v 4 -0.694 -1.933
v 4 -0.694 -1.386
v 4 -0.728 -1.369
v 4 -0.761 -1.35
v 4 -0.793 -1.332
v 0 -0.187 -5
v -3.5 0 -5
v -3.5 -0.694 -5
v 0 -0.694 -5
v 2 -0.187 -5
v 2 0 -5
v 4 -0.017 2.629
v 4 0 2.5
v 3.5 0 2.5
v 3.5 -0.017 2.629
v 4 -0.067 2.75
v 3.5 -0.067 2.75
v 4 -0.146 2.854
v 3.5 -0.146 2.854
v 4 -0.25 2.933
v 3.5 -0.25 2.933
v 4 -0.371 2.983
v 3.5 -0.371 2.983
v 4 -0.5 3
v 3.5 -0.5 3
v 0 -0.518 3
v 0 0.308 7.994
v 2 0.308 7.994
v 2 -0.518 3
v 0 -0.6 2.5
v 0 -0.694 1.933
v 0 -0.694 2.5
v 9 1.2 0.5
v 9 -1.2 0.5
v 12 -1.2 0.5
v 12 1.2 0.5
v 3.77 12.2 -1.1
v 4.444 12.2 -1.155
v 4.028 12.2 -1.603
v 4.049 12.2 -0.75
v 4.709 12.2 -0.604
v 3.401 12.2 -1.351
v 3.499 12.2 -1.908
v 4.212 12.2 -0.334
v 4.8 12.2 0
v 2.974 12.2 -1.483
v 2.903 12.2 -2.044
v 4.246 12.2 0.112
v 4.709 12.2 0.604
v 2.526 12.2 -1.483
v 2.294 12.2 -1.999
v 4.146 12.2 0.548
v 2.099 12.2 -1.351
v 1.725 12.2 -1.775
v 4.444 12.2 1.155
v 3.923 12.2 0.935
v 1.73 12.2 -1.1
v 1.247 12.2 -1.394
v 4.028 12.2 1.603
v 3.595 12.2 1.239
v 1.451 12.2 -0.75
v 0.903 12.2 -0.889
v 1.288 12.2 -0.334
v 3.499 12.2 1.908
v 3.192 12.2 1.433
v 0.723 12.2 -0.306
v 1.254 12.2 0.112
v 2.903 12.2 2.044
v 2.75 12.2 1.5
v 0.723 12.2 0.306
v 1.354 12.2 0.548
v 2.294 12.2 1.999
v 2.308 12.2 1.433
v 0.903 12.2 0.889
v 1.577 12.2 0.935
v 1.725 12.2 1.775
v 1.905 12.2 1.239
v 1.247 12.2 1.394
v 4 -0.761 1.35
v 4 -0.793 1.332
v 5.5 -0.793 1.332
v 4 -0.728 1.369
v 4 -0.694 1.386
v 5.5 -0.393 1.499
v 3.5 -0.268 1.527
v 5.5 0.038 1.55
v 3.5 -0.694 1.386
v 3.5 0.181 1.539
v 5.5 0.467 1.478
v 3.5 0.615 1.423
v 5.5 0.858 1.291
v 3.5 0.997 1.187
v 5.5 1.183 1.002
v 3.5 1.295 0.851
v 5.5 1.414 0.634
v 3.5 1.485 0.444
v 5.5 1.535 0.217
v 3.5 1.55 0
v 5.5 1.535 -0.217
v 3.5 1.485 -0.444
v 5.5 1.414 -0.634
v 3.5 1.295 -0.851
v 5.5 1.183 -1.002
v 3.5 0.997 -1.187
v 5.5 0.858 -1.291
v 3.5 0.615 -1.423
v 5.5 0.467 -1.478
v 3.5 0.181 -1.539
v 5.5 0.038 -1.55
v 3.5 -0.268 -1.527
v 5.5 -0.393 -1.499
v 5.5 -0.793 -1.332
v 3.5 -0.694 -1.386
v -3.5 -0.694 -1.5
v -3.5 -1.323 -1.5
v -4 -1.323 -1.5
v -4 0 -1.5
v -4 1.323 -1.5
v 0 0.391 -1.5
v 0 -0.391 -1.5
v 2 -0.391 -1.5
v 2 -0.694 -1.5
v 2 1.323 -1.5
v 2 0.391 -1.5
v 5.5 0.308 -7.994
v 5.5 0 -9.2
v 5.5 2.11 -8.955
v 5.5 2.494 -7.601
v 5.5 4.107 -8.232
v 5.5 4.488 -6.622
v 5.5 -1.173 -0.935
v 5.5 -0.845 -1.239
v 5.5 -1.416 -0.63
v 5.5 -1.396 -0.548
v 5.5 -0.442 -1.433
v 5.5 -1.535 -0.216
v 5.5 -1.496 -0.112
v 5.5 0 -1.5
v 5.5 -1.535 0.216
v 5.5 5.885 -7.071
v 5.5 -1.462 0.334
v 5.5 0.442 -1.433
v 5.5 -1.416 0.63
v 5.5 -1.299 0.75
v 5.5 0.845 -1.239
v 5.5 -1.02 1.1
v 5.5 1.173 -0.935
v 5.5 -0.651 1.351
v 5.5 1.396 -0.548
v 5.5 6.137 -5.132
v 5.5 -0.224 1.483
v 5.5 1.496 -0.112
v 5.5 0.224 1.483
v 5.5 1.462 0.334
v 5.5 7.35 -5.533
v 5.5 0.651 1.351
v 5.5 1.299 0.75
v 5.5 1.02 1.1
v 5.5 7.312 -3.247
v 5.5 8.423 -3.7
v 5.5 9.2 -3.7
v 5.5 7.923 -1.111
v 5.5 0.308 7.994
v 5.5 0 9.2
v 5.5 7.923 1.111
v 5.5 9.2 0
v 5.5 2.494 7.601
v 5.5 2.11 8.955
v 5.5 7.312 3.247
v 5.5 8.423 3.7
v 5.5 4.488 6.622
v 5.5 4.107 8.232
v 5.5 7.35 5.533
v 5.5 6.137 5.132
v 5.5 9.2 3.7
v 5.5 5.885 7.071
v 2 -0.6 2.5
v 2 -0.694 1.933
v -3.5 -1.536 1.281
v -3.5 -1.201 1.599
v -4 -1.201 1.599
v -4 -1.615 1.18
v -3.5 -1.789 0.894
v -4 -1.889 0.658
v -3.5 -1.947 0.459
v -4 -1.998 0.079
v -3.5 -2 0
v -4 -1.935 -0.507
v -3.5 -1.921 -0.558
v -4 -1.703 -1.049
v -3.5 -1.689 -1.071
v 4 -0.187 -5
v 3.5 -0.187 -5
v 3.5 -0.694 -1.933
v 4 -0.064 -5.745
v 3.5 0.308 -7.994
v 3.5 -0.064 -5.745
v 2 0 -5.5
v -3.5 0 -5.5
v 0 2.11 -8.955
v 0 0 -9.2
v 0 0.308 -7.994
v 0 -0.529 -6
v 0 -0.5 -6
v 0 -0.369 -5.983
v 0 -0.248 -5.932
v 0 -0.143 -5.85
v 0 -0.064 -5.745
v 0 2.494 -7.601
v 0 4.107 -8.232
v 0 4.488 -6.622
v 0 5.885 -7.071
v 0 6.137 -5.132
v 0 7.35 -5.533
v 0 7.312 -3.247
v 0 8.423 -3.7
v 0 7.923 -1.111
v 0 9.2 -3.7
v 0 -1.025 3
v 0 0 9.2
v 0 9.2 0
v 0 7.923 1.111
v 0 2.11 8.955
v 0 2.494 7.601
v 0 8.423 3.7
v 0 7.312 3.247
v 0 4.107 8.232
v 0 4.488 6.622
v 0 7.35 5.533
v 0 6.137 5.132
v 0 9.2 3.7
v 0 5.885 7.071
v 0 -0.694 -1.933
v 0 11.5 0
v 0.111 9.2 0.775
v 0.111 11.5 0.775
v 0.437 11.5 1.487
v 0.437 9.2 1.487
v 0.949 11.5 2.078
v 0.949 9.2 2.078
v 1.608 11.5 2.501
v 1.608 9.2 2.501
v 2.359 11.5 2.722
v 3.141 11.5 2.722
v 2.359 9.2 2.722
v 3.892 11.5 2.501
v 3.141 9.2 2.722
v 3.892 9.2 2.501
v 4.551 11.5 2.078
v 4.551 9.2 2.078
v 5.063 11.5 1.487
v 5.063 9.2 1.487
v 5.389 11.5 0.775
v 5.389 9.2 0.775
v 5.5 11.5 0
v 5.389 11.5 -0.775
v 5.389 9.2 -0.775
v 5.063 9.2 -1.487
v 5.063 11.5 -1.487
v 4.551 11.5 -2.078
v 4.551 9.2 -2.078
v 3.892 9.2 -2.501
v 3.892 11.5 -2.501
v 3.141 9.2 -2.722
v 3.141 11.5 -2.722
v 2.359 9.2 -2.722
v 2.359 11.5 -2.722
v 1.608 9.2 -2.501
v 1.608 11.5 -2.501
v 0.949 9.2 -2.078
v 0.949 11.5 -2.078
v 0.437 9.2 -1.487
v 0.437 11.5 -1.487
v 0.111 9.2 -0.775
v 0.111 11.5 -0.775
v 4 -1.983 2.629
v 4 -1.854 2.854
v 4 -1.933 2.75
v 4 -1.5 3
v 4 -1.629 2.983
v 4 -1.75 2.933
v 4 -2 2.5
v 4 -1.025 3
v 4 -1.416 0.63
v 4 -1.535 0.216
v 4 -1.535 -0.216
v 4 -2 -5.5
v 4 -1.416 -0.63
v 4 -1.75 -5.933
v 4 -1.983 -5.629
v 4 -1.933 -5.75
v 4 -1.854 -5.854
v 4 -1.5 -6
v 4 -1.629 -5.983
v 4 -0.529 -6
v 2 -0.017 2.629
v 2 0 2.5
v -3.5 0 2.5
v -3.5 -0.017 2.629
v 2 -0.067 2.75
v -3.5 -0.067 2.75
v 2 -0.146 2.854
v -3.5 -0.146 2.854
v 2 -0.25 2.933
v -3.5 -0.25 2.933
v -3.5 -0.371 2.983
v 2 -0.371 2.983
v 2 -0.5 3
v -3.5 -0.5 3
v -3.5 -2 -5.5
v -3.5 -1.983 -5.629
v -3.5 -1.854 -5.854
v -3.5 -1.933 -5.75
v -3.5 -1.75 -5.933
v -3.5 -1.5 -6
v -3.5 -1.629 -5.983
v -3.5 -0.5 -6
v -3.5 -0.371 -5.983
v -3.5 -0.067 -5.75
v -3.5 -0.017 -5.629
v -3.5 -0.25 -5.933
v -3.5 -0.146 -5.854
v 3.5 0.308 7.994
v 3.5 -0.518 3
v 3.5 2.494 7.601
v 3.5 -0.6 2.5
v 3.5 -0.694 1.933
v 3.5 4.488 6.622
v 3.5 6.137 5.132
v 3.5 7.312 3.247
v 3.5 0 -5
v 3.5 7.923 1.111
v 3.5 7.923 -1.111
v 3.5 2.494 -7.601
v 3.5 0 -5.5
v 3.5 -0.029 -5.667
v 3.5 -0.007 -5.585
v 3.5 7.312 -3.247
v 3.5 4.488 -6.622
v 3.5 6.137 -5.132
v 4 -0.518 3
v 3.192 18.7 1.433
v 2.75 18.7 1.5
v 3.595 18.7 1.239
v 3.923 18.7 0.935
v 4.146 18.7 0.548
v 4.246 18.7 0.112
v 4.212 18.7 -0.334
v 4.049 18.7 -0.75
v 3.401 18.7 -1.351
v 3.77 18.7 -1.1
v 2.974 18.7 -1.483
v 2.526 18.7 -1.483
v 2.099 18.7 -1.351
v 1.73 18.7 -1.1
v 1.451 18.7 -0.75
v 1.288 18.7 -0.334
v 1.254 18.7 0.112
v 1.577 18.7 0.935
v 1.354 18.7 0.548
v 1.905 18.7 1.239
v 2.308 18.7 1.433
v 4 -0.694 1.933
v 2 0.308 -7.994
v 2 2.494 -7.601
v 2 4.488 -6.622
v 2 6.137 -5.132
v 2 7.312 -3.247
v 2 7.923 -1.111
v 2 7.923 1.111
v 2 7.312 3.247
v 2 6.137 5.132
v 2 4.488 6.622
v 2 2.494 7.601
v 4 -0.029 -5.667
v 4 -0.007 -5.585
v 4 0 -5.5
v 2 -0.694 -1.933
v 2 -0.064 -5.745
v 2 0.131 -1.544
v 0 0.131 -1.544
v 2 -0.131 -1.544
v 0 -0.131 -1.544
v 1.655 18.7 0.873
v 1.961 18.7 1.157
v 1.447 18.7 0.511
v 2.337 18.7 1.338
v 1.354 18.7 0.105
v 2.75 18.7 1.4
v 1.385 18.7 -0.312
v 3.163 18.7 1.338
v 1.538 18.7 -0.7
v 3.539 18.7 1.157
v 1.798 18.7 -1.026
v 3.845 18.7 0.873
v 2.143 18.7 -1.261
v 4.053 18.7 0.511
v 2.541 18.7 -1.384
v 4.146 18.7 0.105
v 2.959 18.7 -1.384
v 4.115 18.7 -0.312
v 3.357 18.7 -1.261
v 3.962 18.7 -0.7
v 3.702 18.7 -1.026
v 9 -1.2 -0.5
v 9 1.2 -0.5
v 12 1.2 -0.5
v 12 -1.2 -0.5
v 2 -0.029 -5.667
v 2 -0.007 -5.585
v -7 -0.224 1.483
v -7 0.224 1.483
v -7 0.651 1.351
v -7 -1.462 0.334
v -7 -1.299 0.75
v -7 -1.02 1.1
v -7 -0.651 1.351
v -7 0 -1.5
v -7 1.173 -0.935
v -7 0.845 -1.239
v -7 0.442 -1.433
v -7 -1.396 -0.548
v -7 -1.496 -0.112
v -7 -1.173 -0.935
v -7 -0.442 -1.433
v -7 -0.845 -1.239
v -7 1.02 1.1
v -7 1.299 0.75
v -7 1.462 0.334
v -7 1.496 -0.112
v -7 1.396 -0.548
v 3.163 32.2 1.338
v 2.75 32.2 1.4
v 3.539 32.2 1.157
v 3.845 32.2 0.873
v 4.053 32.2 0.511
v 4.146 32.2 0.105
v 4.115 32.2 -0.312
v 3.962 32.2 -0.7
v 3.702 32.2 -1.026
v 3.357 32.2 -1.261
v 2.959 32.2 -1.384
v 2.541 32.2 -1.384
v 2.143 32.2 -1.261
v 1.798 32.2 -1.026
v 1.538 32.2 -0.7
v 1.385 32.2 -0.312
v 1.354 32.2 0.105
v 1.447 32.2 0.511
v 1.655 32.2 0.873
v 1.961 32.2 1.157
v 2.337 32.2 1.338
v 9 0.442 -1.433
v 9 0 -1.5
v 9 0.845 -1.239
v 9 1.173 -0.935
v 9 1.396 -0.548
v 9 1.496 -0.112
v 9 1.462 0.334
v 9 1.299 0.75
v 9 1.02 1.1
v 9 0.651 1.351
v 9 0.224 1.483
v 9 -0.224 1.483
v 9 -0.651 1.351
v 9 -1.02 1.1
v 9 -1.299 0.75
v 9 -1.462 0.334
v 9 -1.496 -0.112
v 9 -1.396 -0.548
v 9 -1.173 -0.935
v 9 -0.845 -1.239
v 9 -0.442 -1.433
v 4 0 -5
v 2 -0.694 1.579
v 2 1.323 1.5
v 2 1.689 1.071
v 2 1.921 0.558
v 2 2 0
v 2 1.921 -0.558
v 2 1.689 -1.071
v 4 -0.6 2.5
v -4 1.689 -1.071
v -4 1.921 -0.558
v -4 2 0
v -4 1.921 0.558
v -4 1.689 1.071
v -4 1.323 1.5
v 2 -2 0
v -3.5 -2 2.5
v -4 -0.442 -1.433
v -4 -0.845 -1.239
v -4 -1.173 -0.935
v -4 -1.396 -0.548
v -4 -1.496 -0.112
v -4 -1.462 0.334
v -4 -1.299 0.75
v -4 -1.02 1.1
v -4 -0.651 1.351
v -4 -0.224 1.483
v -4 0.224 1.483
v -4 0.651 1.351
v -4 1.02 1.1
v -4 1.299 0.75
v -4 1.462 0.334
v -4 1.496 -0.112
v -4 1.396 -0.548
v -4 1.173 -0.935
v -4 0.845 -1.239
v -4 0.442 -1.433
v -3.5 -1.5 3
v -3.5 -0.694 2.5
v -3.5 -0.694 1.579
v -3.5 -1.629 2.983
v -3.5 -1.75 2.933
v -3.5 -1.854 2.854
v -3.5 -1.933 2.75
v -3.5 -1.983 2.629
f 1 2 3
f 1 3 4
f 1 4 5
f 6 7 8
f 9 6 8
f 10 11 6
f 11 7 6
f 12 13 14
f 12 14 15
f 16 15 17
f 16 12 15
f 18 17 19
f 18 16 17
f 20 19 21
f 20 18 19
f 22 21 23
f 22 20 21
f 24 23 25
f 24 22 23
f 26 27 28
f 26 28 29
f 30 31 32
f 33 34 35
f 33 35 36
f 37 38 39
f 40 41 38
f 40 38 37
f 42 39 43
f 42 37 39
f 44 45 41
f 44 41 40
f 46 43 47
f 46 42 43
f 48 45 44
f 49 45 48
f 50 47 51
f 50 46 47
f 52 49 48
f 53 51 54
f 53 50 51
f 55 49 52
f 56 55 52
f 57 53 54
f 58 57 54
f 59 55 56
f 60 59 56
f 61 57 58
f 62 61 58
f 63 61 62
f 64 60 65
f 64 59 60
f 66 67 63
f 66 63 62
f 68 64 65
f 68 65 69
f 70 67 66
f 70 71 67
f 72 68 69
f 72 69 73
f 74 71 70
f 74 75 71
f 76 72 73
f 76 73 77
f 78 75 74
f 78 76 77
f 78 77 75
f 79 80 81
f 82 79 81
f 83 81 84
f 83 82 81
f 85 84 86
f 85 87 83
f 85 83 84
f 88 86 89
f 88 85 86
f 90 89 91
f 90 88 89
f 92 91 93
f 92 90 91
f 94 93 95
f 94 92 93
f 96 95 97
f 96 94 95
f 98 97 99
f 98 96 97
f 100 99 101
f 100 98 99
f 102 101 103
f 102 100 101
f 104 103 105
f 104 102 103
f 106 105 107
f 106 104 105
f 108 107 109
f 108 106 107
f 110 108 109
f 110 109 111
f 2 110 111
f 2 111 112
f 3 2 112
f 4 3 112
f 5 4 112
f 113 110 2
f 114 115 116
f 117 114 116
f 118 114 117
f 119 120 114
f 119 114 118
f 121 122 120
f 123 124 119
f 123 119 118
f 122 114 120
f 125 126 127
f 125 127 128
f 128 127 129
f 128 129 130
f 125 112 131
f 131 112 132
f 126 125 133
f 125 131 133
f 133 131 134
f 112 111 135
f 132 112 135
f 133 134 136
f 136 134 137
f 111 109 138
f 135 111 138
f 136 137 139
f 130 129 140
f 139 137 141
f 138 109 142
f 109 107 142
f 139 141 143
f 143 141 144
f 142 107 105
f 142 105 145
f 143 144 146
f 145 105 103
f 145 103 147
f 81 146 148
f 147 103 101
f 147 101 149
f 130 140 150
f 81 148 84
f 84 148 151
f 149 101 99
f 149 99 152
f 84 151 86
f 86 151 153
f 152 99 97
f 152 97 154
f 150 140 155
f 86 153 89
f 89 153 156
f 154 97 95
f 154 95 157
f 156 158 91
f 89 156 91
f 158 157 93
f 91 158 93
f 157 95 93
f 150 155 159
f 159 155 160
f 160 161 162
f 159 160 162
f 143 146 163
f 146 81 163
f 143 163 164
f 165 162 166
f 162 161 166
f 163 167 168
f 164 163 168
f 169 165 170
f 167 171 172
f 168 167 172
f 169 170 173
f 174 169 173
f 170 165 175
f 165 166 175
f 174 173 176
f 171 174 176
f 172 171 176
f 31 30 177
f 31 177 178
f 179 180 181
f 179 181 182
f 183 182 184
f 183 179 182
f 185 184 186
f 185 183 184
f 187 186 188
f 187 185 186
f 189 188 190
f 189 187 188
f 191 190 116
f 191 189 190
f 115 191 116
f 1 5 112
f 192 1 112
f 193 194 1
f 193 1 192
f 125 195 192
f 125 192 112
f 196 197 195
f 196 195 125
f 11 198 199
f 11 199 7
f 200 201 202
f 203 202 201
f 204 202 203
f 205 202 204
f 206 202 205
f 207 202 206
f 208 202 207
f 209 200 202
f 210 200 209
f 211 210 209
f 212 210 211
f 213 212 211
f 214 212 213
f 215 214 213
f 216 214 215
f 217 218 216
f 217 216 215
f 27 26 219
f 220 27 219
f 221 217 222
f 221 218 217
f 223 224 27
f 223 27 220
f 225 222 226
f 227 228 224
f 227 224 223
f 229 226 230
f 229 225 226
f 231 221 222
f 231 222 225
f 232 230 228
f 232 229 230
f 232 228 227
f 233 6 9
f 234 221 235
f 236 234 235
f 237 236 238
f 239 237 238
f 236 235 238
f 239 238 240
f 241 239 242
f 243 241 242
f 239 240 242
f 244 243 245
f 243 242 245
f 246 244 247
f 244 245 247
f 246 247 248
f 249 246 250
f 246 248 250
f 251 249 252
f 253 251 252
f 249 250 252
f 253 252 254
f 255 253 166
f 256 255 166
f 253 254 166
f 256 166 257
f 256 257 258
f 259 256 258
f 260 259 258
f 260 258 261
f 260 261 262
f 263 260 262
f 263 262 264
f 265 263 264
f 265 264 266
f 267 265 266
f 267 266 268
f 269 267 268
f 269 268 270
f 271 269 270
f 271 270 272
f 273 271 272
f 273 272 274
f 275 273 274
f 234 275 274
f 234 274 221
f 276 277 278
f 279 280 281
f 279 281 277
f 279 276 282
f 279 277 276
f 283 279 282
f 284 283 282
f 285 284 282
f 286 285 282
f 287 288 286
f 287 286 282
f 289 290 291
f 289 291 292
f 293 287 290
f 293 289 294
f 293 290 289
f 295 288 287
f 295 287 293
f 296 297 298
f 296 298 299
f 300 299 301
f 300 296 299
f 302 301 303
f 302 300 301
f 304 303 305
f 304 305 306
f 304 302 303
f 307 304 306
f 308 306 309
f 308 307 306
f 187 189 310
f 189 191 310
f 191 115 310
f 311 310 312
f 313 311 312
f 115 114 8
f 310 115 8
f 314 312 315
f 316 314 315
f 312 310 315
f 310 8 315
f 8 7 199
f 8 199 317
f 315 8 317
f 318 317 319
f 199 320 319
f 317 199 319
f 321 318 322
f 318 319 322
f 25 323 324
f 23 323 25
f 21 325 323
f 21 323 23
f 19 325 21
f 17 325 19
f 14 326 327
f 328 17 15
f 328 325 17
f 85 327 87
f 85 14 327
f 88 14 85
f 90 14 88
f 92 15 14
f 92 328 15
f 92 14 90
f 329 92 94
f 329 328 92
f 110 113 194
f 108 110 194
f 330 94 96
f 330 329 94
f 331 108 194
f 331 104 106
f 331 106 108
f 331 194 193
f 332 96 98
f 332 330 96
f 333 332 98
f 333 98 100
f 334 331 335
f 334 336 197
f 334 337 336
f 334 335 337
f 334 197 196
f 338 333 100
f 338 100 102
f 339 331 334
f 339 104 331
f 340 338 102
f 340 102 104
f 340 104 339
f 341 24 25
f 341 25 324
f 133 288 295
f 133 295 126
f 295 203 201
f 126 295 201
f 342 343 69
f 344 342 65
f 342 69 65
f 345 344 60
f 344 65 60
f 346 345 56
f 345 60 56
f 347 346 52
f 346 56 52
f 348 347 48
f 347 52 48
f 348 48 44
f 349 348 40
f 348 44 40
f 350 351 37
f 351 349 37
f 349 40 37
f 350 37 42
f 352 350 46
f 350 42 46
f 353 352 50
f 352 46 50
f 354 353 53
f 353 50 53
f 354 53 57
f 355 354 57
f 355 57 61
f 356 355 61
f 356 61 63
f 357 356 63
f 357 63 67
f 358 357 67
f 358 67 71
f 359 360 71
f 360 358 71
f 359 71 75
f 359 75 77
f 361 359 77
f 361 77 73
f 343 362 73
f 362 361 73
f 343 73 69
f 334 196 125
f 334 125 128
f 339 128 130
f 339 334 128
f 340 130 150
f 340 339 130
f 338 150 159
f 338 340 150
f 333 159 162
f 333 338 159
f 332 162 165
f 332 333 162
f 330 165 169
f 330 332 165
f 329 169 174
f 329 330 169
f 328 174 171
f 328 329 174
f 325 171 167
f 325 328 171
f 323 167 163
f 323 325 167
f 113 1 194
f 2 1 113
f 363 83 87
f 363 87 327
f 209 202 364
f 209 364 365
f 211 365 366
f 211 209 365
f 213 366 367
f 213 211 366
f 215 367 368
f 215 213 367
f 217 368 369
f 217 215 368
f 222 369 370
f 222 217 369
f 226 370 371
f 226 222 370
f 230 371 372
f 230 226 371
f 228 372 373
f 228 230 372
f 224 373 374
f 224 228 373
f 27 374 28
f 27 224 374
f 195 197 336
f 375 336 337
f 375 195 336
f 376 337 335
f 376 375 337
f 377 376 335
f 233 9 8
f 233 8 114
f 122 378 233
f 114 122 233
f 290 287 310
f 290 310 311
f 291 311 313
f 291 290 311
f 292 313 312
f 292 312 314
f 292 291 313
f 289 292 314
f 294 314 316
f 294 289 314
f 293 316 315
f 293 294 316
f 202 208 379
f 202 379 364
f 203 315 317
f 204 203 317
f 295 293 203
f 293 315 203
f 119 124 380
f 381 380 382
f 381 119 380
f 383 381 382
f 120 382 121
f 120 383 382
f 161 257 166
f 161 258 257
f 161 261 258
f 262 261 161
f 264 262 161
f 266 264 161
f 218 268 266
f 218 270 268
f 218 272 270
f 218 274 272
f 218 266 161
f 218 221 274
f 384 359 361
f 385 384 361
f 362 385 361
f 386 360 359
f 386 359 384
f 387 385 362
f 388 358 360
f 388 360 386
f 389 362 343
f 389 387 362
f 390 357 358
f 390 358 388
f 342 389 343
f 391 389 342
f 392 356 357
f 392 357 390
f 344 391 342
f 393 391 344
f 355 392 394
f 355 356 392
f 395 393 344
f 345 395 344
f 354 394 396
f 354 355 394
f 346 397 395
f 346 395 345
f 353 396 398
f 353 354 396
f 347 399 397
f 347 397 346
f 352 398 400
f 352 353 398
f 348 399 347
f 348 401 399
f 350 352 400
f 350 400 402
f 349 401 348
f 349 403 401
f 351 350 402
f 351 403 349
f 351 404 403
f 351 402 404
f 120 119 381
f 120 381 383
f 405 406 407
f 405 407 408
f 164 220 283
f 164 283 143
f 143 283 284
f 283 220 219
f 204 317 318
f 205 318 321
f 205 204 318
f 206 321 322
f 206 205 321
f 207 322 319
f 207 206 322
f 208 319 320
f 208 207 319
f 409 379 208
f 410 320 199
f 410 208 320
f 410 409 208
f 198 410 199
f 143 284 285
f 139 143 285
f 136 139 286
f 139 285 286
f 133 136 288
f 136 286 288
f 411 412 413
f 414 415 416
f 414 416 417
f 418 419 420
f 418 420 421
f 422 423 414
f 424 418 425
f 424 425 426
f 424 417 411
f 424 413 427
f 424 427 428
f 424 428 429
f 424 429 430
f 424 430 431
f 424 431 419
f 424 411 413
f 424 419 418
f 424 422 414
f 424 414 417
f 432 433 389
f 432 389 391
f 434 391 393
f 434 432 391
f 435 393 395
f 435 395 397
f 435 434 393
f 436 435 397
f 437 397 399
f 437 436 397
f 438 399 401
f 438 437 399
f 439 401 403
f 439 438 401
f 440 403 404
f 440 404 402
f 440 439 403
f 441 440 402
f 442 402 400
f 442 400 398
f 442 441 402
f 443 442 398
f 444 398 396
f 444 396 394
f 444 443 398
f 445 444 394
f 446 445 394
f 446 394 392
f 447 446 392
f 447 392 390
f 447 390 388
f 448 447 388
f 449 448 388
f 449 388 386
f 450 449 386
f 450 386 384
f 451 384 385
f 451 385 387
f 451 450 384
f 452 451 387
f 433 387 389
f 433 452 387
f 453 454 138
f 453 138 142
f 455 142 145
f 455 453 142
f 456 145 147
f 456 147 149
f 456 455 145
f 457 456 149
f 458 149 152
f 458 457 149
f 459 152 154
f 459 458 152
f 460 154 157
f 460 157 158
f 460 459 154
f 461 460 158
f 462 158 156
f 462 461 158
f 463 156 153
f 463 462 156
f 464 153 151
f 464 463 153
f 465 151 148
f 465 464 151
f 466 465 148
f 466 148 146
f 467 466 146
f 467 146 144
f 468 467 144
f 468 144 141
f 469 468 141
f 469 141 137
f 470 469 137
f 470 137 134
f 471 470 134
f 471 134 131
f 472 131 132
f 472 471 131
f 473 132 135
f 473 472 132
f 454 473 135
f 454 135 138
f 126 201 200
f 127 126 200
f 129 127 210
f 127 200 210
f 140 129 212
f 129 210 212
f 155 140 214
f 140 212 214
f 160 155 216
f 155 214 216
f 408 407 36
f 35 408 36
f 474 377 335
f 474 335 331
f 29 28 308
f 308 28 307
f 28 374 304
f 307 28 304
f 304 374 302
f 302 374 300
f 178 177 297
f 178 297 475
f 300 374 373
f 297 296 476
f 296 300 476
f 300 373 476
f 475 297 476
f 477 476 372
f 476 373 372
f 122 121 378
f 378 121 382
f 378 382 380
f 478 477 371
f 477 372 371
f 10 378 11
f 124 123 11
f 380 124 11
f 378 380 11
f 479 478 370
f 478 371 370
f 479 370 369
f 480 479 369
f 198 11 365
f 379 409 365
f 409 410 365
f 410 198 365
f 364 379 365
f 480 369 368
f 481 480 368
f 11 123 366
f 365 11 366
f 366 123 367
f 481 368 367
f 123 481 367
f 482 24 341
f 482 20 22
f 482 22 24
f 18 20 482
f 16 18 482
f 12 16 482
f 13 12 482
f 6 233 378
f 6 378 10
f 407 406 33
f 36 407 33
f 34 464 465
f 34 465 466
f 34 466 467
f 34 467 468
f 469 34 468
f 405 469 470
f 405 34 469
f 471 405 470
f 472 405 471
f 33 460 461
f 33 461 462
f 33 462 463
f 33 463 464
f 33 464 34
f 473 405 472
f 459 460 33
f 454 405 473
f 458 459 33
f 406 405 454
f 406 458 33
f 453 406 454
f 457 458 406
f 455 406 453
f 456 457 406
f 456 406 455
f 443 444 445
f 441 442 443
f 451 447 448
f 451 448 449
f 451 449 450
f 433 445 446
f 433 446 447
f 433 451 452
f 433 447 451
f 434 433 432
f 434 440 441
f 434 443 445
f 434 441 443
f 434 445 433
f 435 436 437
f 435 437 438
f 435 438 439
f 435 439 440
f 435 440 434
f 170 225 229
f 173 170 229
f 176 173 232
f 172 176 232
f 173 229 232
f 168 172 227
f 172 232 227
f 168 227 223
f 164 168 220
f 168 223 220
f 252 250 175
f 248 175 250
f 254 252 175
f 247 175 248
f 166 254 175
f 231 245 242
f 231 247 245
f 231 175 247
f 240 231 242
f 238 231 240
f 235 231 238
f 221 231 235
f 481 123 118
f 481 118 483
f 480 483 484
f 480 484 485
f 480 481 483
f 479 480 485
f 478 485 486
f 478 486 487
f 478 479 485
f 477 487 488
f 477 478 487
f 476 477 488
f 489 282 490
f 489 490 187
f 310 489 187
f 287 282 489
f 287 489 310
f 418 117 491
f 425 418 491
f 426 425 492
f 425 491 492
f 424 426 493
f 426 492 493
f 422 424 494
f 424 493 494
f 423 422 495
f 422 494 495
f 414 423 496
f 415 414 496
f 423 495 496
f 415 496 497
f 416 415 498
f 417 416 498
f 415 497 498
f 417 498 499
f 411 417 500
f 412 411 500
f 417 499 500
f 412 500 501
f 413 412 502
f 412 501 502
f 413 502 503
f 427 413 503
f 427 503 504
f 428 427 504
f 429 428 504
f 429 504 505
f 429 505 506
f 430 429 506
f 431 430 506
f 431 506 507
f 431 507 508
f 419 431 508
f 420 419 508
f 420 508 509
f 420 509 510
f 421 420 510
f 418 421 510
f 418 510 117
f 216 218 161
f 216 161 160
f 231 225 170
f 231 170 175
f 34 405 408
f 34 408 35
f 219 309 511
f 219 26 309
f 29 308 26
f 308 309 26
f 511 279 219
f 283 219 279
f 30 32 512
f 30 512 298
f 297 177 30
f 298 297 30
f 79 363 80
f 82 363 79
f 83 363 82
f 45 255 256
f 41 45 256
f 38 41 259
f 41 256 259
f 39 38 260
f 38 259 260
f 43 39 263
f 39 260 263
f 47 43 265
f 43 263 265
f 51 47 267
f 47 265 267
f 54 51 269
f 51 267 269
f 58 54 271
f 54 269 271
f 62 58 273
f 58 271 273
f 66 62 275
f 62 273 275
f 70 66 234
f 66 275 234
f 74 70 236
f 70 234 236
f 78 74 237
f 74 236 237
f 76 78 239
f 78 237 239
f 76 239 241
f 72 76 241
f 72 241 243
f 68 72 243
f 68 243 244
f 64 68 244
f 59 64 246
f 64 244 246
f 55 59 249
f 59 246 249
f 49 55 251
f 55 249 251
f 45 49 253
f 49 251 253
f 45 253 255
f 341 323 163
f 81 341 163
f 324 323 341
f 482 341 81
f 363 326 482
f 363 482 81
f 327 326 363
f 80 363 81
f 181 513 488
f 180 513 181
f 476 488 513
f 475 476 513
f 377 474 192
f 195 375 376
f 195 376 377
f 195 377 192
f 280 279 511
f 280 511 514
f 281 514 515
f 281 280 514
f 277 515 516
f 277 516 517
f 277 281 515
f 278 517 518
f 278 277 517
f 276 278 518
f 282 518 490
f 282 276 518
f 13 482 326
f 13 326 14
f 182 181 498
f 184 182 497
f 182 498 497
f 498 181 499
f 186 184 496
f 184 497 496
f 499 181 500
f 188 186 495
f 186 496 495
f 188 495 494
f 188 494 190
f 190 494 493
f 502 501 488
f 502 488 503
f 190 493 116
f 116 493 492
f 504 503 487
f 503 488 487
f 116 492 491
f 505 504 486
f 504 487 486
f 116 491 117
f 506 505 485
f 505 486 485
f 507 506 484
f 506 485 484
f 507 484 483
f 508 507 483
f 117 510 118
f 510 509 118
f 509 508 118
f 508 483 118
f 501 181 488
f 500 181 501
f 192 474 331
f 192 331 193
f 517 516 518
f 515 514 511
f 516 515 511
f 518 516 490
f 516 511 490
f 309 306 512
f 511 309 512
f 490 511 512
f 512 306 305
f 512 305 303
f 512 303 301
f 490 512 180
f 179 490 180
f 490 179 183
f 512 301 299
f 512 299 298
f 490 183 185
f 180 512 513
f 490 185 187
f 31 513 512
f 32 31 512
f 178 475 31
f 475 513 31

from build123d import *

# Parameters (mm, degrees)
EXTRUDE_1_DEPTH     = 5.5
CUT_EXTRUDE_START   = -2
CUT_EXTRUDE_1_DEPTH = 2
CUT_EXTRUDE_2_DEPTH = 2
EXTRUDE_2_DEPTH     = 5.5
SKETCH_5_R          = 2.75
EXTRUDE_3_DEPTH     = 3
CHAMFER_1_SIZE      = 0.7
SKETCH_6_R          = 1.5
EXTRUDE_4_DEPTH     = 20
SKETCH_7_R          = 1.5
EXTRUDE_5_DEPTH     = 7
EXTRUDE_START       = 3.5
SKETCH_8_R          = 1.5
EXTRUDE_6_DEPTH     = 3.5
EXTRUDE_7_DEPTH     = 3
EXTRUDE_8_DEPTH     = 7.5
EXTRUDE_9_DEPTH     = 6
SKETCH_12_R         = 2.369511938
SKETCH_12_R_2       = 1.4
CUT_EXTRUDE_3_DEPTH = 13.5


with BuildPart() as part:
    # 草图1 → 凸台-拉伸1 (new body)
    with BuildSketch(Plane(origin=(0, 0, 0), x_dir=(0, 0, -1), z_dir=(1, 0, 0))):
        with BuildLine():
            Line((-9.2, 0), (-0.630158831, -1.41612141))
            ThreePointArc((-0.630158831, -1.41612141), (0, -1.55), (0.630158831, -1.41612141))
            Line((0.630158831, -1.41612141), (9.2, 0))
            ThreePointArc((9.2, 0), (0, 9.2), (-9.2, 0))
        make_face()
    extrude(amount=EXTRUDE_1_DEPTH)

    # 草图2 → 切除-拉伸1 (cut)
    with BuildSketch(Plane(origin=(5.5, 0, 0), x_dir=(0, 0, -1), z_dir=(1, 0, 0)).offset(CUT_EXTRUDE_START)):
        with BuildLine():
            Line((-7.994087674, 0.307509782), (-1.331520023, -0.79344466))
            ThreePointArc((-1.331520023, -0.79344466), (0, 1.55), (1.331520023, -0.79344466))
            Line((1.331520023, -0.79344466), (7.994087674, 0.307509782))
            ThreePointArc((7.994087674, 0.307509782), (0, 8), (-7.994087674, 0.307509782))
        make_face()
    extrude(amount=CUT_EXTRUDE_1_DEPTH, mode=Mode.SUBTRACT)

    # 草图3 → 切除-拉伸2 (cut)
    with BuildSketch(Plane.ZY):
        with BuildLine():
            Line((-1.331520023, -0.79344466), (-7.994087674, 0.307509782))
            ThreePointArc((-7.994087674, 0.307509782), (0, 8), (7.994087674, 0.307509782))
            Line((7.994087674, 0.307509782), (1.331520023, -0.79344466))
            ThreePointArc((1.331520023, -0.79344466), (0, 1.55), (-1.331520023, -0.79344466))
        make_face()
    extrude(amount=-CUT_EXTRUDE_2_DEPTH, mode=Mode.SUBTRACT)

    # 草图4 → 凸台-拉伸2 (add)
    with BuildSketch(Plane.ZY):
        Polygon((0, 9.2), (-3.7, 9.2), (-3.7, 8.423182296), (3.7, 8.423182296), (3.7, 9.2), align=None)
    extrude(amount=-EXTRUDE_2_DEPTH)

    # 草图5 → 凸台-拉伸3 (add)
    with BuildSketch(Plane(origin=(0, 9.2, 0), x_dir=(1, 0, 0), z_dir=(0, 1, 0))):
        with Locations((2.75, 0)):
            Circle(SKETCH_5_R)
    extrude(amount=EXTRUDE_3_DEPTH)

    # Chamfer 1
    chamfer_1_edges = [part.edges().sort_by_distance(p)[0] for p in [
        (0, 12.2, 0),
    ]]
    chamfer(chamfer_1_edges, length=CHAMFER_1_SIZE)

    # 草图6 → 凸台-拉伸4 (add)
    with BuildSketch(Plane(origin=(0, 12.2, 0), x_dir=(1, 0, 0), z_dir=(0, 1, 0))):
        with Locations((2.75, 0)):
            Circle(SKETCH_6_R)
    extrude(amount=EXTRUDE_4_DEPTH)

    # 草图7 → 凸台-拉伸5 (add)
    with BuildSketch(Plane.ZY):
        Circle(SKETCH_7_R)
    extrude(amount=EXTRUDE_5_DEPTH)

    # 草图8 → 凸台-拉伸6 (add)
    with BuildSketch(Plane(origin=(5.5, 0, 0), x_dir=(0, 0, -1), z_dir=(1, 0, 0)).offset(EXTRUDE_START)):
        Circle(SKETCH_8_R)
    extrude(amount=-EXTRUDE_6_DEPTH)

    # 草图9 → 凸台-拉伸7 (add)
    with BuildSketch(Plane(origin=(9, 0, 0), x_dir=(0, 0, -1), z_dir=(1, 0, 0))):
        Polygon((0, 1.2), (0.5, 1.2), (0.5, -1.2), (-0.5, -1.2), (-0.5, 1.2), align=None)
    extrude(amount=EXTRUDE_7_DEPTH)

    # 草图10 → 凸台-拉伸8 (add)
    with BuildSketch(Plane(origin=(4, 0, 0), x_dir=(0, 0, -1), z_dir=(1, 0, 0))):
        with BuildLine():
            Line((5.5, 0), (5, 0))
            Line((5, 0), (5, -0.694028023))
            Line((5, -0.694028023), (-2.5, -0.694028023))
            Line((-2.5, -0.694028023), (-2.5, 0))
            ThreePointArc((-2.5, 0), (-2.853553391, -0.146446609), (-3, -0.5))
            Line((-3, -0.5), (-3, -1.5))
            ThreePointArc((-3, -1.5), (-2.853553391, -1.853553391), (-2.5, -2))
            Line((-2.5, -2), (0, -2))
            Line((0, -2), (5.5, -2))
            ThreePointArc((5.5, -2), (5.853553391, -1.853553391), (6, -1.5))
            Line((6, -1.5), (6, -0.5))
            ThreePointArc((6, -0.5), (5.853553391, -0.146446609), (5.5, 0))
        make_face()
    extrude(amount=-EXTRUDE_8_DEPTH)

    # 草图11 → 凸台-拉伸9 (add)
    with BuildSketch(Plane.ZY.offset(-2)):
        with BuildLine():
            Line((-1.5, 0), (-1.5, 1.322875656))
            ThreePointArc((-1.5, 1.322875656), (0, 2), (1.5, 1.322875656))
            Line((1.5, 1.322875656), (1.599468005, -1.200709))
            ThreePointArc((1.599468005, -1.200709), (0.078769562, -1.998448237), (-1.5, -1.322875656))
            Line((-1.5, -1.322875656), (-1.5, 0))
        make_face()
    extrude(amount=EXTRUDE_9_DEPTH)

    # 草图12 → 切除-拉伸3 (cut)
    with BuildSketch(Plane(origin=(0, 32.2, 0), x_dir=(1, 0, 0), z_dir=(0, 1, 0))):
        with Locations((2.75, 0)):
            Circle(SKETCH_12_R)
        with Locations((2.75, 0)):
            Circle(SKETCH_12_R_2, mode=Mode.SUBTRACT)
    extrude(amount=-CUT_EXTRUDE_3_DEPTH, mode=Mode.SUBTRACT)


solid = part.part
